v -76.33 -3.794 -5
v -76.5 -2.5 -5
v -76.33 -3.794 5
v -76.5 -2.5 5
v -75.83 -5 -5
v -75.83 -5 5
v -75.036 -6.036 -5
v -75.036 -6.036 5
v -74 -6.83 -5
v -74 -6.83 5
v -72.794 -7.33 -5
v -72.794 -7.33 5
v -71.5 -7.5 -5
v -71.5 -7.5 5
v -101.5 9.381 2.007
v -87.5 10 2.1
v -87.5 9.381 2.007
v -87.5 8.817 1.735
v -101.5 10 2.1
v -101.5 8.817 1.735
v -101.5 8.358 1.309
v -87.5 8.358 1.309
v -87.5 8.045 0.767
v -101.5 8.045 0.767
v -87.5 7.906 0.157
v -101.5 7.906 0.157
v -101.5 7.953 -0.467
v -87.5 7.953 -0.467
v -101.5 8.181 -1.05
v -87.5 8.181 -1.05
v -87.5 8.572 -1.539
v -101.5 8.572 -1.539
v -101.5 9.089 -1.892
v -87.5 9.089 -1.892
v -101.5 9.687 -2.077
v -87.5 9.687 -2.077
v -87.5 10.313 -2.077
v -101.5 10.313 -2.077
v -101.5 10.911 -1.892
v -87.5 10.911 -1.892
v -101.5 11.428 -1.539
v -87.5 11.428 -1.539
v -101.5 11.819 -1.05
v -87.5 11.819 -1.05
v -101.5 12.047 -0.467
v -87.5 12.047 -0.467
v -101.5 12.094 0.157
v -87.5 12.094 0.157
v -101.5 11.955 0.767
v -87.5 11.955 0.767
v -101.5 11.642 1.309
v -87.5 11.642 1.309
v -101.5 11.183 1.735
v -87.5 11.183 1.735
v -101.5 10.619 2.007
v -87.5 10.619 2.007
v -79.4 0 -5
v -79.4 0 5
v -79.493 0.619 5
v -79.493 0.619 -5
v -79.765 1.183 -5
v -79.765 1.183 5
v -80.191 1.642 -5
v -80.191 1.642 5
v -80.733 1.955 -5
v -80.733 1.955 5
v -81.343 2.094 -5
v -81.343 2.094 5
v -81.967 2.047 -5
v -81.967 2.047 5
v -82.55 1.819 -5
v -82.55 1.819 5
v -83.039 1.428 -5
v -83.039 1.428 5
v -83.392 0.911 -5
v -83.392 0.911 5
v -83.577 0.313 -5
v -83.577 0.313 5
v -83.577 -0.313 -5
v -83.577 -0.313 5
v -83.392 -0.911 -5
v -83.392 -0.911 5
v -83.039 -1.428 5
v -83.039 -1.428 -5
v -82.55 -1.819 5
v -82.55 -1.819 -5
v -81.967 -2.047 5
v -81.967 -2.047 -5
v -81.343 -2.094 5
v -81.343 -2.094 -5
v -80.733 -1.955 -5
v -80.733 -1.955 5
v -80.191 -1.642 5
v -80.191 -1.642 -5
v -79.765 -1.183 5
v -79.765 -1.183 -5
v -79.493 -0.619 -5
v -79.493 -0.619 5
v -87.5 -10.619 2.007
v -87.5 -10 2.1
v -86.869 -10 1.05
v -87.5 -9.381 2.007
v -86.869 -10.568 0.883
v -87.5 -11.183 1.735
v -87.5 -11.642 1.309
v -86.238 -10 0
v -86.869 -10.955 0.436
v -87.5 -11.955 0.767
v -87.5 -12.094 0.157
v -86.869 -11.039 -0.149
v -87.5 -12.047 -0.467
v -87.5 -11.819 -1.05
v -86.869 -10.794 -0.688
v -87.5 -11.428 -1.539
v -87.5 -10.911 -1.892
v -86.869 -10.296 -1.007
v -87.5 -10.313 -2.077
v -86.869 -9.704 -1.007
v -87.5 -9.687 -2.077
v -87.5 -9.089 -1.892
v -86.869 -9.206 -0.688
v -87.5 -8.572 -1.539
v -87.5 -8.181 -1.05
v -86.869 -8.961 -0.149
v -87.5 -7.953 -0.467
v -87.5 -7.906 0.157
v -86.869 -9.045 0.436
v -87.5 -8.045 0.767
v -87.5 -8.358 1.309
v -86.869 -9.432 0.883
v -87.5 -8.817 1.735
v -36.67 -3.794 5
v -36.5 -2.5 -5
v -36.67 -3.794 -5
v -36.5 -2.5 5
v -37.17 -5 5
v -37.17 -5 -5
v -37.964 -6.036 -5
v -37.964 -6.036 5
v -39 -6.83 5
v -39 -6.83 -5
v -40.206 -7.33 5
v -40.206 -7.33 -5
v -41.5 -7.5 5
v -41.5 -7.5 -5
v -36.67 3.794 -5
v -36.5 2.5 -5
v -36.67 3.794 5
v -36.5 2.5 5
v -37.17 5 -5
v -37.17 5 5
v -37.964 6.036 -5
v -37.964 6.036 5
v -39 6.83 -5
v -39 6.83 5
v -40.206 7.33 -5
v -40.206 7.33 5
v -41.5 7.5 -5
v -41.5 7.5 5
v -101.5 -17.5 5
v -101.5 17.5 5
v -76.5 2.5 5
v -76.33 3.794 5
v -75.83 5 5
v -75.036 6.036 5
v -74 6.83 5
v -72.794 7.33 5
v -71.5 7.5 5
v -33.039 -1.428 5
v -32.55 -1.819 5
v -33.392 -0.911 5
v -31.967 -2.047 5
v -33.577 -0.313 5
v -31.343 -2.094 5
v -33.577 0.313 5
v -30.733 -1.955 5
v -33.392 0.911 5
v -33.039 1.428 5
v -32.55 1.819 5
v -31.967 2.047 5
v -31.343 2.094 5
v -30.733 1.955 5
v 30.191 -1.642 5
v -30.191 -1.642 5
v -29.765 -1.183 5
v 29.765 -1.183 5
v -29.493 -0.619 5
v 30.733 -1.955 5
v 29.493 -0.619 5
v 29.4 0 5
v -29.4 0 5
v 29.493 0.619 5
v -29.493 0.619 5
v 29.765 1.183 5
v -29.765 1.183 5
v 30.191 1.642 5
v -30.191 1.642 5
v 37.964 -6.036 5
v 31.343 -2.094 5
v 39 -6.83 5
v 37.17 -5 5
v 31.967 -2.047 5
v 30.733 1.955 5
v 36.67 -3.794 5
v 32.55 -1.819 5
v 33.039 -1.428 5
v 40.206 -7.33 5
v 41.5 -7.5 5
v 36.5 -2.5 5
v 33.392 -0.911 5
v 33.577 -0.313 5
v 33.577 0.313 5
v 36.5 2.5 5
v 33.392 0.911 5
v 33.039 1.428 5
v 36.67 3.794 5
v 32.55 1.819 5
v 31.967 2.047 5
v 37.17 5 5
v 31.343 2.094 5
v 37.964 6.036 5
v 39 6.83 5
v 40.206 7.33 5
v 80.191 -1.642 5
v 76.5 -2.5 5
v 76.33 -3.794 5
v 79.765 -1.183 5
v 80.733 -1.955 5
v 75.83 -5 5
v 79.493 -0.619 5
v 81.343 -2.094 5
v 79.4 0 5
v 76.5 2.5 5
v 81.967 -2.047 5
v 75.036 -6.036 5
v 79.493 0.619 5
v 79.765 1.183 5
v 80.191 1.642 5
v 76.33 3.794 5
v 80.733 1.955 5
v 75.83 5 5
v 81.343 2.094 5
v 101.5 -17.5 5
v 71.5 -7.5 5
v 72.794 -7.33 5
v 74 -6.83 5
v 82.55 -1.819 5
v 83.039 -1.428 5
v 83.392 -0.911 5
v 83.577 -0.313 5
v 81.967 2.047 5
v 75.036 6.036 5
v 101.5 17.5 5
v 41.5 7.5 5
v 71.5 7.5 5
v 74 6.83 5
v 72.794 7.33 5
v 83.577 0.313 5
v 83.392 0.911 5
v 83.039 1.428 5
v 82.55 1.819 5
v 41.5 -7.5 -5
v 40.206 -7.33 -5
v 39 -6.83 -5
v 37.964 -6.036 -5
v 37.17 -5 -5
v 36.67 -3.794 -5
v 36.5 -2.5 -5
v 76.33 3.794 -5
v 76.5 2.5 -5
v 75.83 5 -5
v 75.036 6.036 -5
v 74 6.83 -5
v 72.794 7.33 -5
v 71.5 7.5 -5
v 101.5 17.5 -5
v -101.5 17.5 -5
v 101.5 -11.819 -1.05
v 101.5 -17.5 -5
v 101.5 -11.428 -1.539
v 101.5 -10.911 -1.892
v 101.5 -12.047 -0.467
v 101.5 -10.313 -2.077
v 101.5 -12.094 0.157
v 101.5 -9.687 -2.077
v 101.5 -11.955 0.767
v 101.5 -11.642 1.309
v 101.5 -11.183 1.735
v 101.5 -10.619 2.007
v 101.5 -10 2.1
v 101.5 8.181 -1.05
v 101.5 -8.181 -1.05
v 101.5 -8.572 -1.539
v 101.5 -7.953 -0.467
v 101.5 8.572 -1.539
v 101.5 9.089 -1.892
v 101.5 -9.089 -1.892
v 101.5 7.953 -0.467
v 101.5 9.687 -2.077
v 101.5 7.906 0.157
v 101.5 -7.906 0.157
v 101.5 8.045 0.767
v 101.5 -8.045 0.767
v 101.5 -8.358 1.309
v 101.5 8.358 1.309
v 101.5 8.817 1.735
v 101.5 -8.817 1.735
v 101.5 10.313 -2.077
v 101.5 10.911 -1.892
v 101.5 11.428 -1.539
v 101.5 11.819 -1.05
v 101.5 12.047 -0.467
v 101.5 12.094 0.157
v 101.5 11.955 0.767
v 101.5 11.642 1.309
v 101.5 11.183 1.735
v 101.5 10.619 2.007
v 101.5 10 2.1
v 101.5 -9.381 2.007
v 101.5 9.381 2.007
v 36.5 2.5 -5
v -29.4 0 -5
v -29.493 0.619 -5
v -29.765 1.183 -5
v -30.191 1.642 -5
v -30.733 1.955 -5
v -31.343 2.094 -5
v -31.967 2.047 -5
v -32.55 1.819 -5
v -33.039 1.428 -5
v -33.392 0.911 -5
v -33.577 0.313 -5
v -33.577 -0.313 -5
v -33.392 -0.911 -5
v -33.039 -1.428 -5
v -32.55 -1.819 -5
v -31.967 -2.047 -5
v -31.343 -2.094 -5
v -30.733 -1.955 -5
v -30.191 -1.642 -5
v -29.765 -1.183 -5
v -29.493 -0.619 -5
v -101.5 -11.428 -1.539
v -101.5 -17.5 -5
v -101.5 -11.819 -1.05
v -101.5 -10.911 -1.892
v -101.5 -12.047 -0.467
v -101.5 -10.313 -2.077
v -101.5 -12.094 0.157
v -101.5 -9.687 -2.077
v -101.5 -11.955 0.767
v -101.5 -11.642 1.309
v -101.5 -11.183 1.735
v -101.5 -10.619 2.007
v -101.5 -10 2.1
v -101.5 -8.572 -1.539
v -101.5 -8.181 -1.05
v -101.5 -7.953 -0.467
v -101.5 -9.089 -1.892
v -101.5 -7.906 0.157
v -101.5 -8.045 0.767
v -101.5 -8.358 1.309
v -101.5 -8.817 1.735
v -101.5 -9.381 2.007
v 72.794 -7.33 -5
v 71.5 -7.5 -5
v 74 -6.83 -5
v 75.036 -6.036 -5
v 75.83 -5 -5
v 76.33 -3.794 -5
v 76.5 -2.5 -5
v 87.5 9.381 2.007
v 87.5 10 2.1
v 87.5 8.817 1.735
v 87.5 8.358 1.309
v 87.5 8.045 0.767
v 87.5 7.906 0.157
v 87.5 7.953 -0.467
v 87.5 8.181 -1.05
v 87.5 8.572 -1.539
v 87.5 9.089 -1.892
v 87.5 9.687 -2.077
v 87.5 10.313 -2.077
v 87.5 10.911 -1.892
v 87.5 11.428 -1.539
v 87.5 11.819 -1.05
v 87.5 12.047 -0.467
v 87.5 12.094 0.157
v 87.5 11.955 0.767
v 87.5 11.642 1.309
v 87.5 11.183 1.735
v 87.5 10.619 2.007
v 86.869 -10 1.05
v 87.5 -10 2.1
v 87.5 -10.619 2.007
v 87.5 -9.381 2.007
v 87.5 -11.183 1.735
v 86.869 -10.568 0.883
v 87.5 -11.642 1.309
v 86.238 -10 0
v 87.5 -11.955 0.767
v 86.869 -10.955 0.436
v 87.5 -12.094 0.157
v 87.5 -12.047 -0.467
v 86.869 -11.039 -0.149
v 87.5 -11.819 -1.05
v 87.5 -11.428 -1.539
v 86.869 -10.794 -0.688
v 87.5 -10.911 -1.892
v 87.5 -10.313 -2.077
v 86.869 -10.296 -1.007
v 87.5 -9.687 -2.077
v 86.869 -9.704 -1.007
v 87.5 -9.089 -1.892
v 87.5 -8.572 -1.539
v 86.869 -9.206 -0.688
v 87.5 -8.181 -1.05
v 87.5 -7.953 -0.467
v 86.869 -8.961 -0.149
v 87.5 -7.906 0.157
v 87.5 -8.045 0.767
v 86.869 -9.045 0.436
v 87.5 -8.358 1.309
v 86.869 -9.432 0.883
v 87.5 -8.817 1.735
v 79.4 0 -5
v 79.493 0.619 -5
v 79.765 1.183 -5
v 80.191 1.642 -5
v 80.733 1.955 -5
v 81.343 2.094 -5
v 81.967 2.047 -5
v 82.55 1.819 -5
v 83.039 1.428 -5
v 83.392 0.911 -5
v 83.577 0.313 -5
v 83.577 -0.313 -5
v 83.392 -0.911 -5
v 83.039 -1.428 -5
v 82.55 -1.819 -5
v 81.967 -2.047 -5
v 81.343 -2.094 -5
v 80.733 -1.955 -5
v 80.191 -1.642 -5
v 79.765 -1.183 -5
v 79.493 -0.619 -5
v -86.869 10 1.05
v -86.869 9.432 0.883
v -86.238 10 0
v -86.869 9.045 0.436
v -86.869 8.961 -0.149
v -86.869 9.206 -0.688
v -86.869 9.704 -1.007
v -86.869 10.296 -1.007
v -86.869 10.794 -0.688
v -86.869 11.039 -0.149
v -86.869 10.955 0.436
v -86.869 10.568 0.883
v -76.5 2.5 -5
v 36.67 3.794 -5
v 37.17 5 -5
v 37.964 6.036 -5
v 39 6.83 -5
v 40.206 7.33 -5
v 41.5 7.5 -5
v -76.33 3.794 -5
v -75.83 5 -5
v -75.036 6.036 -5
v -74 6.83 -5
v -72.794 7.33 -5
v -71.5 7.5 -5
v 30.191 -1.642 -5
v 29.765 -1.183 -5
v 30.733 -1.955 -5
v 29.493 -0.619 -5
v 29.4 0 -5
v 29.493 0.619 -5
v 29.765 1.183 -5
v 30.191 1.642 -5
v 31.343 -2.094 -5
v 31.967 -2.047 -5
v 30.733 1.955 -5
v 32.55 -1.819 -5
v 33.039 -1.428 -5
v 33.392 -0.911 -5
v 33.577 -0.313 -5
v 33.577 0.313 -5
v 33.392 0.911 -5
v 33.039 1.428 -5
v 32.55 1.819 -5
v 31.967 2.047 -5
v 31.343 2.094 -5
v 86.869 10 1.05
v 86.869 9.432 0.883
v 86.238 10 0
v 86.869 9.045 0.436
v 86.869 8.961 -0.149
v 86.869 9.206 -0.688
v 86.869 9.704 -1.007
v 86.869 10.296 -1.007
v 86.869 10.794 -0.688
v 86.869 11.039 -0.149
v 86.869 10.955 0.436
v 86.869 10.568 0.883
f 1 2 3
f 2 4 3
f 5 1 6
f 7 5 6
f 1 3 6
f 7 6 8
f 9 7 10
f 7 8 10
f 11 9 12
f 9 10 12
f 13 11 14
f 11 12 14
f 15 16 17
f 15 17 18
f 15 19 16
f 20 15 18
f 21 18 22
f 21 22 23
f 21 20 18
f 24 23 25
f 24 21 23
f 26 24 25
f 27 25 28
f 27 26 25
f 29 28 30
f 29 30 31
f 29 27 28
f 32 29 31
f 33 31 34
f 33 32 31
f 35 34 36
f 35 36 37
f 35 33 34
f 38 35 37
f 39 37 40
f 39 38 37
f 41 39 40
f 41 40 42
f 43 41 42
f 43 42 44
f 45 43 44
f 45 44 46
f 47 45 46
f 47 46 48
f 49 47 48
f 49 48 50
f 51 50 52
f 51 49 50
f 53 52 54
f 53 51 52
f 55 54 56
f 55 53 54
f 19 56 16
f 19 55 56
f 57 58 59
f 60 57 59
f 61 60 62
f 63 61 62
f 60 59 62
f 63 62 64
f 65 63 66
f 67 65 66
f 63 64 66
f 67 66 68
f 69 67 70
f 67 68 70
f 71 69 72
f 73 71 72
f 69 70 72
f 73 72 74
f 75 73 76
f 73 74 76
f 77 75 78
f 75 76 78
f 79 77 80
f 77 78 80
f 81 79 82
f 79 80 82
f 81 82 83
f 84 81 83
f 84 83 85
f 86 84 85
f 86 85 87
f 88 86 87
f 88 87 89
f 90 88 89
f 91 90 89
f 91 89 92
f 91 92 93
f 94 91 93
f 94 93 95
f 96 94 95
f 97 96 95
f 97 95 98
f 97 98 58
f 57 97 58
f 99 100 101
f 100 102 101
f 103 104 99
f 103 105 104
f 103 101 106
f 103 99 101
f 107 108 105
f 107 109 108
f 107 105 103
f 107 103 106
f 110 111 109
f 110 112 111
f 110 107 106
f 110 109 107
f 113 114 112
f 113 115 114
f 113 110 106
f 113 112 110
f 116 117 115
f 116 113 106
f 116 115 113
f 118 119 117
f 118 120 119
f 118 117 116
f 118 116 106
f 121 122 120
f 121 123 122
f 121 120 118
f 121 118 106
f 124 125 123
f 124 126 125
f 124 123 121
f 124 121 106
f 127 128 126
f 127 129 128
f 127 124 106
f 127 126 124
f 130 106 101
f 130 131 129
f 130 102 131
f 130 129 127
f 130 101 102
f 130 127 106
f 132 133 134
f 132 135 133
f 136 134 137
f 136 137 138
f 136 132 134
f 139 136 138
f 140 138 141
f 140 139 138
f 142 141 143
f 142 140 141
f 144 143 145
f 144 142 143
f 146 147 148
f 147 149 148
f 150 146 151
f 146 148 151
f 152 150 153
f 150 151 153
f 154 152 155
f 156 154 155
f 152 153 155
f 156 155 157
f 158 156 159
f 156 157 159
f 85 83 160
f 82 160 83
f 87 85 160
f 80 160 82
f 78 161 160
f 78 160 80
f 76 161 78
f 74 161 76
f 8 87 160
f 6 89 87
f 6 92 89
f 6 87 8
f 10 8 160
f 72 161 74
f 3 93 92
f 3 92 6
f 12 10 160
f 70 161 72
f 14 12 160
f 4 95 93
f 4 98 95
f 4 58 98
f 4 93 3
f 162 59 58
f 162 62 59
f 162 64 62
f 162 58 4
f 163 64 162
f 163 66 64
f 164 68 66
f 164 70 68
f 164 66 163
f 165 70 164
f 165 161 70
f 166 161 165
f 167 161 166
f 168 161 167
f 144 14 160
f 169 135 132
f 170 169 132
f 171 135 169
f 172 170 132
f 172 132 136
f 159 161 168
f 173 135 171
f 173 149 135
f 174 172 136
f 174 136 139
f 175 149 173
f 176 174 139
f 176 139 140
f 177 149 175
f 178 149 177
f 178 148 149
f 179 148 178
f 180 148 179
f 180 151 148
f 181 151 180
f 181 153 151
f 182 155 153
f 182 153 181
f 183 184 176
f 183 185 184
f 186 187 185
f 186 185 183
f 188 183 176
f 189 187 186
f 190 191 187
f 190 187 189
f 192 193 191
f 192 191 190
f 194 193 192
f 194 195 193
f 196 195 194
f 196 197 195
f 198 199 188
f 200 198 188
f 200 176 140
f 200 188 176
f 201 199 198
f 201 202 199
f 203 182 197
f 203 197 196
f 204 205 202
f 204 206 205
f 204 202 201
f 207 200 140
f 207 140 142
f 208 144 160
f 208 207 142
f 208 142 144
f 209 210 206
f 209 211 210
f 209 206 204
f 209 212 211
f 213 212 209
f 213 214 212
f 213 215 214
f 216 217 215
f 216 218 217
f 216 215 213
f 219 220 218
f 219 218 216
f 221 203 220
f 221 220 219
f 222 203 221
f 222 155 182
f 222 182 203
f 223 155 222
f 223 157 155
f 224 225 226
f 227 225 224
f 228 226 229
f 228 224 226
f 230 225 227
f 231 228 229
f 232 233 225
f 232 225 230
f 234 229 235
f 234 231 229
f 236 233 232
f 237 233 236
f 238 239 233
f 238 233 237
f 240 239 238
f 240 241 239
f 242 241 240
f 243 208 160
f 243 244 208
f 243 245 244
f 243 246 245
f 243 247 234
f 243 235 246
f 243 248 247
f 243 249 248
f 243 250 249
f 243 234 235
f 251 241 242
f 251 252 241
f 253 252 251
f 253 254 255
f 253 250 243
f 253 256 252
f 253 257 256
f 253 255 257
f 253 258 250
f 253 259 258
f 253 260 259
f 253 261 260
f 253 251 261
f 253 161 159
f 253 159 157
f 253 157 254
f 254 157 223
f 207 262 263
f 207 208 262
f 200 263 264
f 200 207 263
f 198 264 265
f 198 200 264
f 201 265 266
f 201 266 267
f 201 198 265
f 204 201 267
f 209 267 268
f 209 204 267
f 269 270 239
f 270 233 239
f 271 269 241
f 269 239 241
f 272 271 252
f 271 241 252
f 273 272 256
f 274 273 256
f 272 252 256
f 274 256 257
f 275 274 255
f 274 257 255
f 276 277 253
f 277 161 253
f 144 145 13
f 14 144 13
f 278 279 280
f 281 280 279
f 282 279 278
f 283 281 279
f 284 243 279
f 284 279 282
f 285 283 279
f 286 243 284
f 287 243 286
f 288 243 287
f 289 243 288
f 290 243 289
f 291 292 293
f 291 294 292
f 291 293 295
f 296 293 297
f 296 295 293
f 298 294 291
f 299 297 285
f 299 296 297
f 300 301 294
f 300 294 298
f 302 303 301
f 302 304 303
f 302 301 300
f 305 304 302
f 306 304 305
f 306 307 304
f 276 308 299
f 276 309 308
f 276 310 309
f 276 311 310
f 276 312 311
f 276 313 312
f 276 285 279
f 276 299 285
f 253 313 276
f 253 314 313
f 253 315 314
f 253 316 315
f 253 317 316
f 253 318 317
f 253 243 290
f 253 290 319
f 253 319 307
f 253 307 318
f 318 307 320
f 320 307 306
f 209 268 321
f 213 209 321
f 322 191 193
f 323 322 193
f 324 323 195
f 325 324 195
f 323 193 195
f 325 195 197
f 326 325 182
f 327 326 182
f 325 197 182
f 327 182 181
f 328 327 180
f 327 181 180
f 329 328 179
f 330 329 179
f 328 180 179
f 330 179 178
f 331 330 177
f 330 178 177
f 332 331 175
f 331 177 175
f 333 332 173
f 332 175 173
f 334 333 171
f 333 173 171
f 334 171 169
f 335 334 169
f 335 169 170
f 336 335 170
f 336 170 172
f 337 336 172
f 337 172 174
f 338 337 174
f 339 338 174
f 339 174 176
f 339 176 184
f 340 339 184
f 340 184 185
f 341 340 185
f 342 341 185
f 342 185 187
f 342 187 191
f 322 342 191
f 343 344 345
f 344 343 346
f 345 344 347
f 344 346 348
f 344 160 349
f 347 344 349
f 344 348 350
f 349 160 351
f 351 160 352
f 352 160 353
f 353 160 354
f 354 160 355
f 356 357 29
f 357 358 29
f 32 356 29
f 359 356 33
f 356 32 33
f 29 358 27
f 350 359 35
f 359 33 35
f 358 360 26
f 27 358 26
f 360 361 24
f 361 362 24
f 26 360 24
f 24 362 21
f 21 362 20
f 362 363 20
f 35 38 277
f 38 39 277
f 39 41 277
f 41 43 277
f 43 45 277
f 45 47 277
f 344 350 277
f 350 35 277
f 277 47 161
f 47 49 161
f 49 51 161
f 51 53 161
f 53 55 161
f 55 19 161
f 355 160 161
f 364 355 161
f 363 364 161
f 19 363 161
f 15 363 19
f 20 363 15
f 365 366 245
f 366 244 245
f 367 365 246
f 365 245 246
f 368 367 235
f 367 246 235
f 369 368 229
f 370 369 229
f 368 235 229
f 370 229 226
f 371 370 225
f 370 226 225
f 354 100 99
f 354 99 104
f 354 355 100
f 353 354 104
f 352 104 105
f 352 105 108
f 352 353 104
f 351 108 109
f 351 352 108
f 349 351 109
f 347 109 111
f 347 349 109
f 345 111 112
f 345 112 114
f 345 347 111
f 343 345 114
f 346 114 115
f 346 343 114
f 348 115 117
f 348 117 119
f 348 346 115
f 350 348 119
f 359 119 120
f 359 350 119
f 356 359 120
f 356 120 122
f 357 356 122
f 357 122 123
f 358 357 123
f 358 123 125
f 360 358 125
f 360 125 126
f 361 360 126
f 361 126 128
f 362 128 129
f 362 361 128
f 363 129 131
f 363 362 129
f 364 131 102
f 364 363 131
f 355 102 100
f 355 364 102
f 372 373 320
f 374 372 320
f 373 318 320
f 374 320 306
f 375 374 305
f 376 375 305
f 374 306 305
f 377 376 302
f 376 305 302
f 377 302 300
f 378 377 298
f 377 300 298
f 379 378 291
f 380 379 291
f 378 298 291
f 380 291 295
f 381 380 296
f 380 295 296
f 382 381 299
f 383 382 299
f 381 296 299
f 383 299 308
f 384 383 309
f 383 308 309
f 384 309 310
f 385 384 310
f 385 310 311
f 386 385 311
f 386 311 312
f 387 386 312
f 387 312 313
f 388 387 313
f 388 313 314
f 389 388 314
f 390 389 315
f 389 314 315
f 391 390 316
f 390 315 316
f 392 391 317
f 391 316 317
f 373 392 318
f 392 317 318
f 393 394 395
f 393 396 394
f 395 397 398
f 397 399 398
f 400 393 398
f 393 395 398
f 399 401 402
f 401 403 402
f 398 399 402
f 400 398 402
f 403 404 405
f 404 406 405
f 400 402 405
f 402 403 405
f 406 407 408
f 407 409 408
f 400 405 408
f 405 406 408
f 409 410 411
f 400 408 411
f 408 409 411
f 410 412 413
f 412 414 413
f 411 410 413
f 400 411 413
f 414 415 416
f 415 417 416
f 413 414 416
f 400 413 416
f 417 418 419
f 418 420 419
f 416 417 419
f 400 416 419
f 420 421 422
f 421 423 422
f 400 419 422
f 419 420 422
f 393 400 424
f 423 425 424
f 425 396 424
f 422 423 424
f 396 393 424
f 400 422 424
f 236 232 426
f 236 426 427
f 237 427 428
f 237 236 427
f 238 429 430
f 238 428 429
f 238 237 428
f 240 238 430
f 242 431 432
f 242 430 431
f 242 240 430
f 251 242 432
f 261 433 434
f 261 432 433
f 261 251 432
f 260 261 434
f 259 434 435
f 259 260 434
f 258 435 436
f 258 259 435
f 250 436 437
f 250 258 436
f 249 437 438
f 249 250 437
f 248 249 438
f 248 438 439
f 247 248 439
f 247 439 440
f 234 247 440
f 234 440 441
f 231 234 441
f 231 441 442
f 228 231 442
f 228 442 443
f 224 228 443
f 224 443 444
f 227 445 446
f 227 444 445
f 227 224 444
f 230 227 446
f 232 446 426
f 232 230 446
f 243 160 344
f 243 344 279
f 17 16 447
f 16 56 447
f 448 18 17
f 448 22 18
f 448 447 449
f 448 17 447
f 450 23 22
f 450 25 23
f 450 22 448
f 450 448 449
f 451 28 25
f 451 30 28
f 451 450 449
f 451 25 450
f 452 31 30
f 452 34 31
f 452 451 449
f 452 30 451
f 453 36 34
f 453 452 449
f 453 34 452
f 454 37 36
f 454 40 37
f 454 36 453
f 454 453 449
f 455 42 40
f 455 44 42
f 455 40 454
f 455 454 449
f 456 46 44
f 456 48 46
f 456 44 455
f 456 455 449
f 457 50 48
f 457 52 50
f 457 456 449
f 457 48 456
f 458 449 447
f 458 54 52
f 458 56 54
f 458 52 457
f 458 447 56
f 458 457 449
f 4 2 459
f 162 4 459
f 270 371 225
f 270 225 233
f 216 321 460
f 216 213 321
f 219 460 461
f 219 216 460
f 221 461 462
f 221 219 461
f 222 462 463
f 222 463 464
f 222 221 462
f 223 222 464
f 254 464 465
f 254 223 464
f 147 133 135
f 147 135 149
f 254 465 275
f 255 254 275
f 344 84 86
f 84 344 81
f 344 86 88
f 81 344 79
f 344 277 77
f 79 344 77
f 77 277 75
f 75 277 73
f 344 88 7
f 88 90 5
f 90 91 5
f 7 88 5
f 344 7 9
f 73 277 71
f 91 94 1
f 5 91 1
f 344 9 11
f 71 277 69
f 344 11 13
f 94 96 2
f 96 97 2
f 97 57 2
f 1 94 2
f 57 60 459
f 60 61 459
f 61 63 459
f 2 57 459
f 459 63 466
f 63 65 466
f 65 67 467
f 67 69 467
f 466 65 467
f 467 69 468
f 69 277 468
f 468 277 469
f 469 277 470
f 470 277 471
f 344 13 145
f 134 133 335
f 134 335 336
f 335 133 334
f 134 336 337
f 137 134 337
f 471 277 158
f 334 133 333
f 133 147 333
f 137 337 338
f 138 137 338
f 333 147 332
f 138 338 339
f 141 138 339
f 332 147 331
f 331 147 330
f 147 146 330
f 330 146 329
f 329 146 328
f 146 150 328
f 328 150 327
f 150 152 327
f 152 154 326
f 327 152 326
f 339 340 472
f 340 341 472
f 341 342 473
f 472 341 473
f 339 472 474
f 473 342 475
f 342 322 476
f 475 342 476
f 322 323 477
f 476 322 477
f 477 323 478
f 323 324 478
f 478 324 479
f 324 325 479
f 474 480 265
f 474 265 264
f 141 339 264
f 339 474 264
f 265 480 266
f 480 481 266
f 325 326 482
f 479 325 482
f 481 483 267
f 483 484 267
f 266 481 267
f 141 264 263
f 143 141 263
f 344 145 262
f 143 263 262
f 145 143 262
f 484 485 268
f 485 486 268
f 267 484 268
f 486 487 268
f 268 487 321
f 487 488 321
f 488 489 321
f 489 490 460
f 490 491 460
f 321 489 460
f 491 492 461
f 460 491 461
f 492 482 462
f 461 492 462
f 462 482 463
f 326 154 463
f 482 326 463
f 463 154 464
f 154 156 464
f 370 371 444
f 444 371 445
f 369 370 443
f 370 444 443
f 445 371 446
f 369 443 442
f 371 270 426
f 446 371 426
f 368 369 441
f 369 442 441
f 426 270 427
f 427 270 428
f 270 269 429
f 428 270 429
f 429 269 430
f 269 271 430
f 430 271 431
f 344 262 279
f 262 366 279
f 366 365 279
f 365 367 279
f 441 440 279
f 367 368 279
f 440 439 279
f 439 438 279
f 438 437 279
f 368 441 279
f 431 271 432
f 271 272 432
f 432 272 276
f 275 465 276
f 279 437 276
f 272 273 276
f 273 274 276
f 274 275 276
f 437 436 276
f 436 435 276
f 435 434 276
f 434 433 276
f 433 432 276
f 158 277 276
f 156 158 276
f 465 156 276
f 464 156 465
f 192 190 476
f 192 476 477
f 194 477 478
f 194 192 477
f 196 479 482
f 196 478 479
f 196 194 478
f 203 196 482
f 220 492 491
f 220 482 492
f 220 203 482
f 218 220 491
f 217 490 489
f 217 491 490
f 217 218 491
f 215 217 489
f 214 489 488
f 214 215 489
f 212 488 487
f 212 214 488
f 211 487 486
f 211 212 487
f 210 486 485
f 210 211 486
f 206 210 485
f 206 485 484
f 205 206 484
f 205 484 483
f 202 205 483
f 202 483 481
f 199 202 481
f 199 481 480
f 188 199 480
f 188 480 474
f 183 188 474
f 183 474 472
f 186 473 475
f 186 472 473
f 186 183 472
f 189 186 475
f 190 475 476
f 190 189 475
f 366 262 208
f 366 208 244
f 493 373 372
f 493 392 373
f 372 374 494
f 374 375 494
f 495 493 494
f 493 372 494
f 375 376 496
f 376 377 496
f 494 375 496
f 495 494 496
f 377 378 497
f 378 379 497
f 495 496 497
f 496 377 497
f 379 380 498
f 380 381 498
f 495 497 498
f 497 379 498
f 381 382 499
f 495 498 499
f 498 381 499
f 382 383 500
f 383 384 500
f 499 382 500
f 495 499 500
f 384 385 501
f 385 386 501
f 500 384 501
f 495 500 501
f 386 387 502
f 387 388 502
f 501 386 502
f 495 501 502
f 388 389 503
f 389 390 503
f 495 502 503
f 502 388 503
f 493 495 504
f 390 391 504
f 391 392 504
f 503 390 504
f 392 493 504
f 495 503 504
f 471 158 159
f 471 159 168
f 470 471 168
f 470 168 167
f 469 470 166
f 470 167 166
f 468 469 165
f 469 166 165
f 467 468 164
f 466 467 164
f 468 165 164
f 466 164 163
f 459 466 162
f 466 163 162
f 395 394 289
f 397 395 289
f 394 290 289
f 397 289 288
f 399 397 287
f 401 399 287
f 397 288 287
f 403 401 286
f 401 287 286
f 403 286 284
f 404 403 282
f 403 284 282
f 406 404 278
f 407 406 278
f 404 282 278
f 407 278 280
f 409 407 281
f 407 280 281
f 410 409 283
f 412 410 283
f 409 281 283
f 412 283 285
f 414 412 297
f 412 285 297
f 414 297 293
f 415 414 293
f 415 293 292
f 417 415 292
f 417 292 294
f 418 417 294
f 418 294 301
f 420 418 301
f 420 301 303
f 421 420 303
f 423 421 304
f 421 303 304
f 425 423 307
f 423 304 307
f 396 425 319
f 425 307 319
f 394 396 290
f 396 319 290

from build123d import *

# Parameters (mm, degrees)
SKETCH_1_W                  = 203
SKETCH_1_H                  = 35
EXTRUDE_1_DEPTH             = 5
HOLE_WIZARD_M5_1_AT_2_COUNT = 2
HOLE_WIZARD_M5_1_AT_2_PITCH = 20
SKETCH_4_W                  = 40
SKETCH_4_H                  = 15
CUT_EXTRUDE_1_DEPTH         = 10
FILLET_1_R                  = 5
HOLE_WIZARD_4_2_4_2_1_D     = 4.2
FILLET_1_OF_MIRROR_2_R      = 5


with BuildPart() as part:
    # 草图1 → 凸台-拉伸1 (new body, symmetric)
    with BuildSketch(Plane.XY):
        Rectangle(SKETCH_1_W, SKETCH_1_H)
    extrude(amount=EXTRUDE_1_DEPTH, both=True)

    # 草图2 → M5 螺纹孔1 (revolve, cut)
    with BuildSketch(Plane(origin=(-101.5, 10, 0), x_dir=(0, 0, 1), z_dir=(0, 1, 0))):
        Polygon((0, 0), (0, 15.2618073), (2.1, 14), (2.1, 0), align=None)
    hole_wizard_m5_1 = revolve(axis=Axis((-107.85, 10, 0), (1, 0, 0)), mode=Mode.SUBTRACT)

    # M5 螺纹孔1 at 2: M5 螺纹孔1 ×2
    with Locations(*[(0, -i * HOLE_WIZARD_M5_1_AT_2_PITCH, 0) for i in range(1, HOLE_WIZARD_M5_1_AT_2_COUNT)]):
        add(hole_wizard_m5_1, mode=Mode.SUBTRACT)

    # 镜向1: M5 螺纹孔1 across plane
    add(hole_wizard_m5_1.mirror(Plane(origin=(0, 0, 0), x_dir=(0, 0, 1), z_dir=(1, 0, 0))), mode=Mode.SUBTRACT)

    # 镜向1 copy 1 sketch → 镜向1 copy 1 (revolve, cut)
    with BuildSketch(Plane(origin=(101.5, -10, 0), x_dir=(0, 0, 1), z_dir=(0, 1, 0))):
        Polygon((0, 0), (0, -15.2618073), (2.1, -14), (2.1, 0), align=None)
    revolve(axis=Axis((107.85, -10, 0), (1, 0, 0)), mode=Mode.SUBTRACT)

    # 草图4 → 切除-拉伸1 (cut)
    with BuildSketch(Plane(origin=(0, 0, -5), x_dir=(-1, 0, 0), z_dir=(0, 0, -1))):
        with Locations((56.5, 0)):
            Rectangle(SKETCH_4_W, SKETCH_4_H)
    cut_extrude_1 = extrude(amount=-CUT_EXTRUDE_1_DEPTH, mode=Mode.SUBTRACT)

    # 圆角1
    fillet_1_edges = [part.edges().sort_by_distance(p)[0] for p in [
        (-76.5, 7.5, 0),
        (-76.5, -7.5, 0),
        (-36.5, -7.5, 0),
        (-36.5, 7.5, 0),
    ]]
    fillet(fillet_1_edges, radius=FILLET_1_R)

    # Ø4.2 (4.2) 直径孔1 (through all)
    with Locations(Plane(origin=(0, 0, -5), x_dir=(-1, 0, 0), z_dir=(0, 0, -1))):
        with Locations((81.5, 0), (31.5, 0)):
            hole_wizard_4_2_4_2_1 = Hole(HOLE_WIZARD_4_2_4_2_1_D / 2)

    # 镜向2: 切除-拉伸1, Ø4.2 (4.2) 直径孔1 across plane
    add(cut_extrude_1.mirror(Plane(origin=(0, 0, 0), x_dir=(0, 0, 1), z_dir=(1, 0, 0))), mode=Mode.SUBTRACT)
    add(hole_wizard_4_2_4_2_1.mirror(Plane(origin=(0, 0, 0), x_dir=(0, 0, 1), z_dir=(1, 0, 0))), mode=Mode.SUBTRACT)

    # 圆角1 of 镜向2
    fillet_1_of_mirror_2_edges = [part.edges().sort_by_distance(p)[0] for p in [
        (76.5, 7.5, 0),
        (76.5, -7.5, 0),
        (36.5, -7.5, 0),
        (36.5, 7.5, 0),
    ]]
    fillet(fillet_1_of_mirror_2_edges, radius=FILLET_1_OF_MIRROR_2_R)


solid = part.part
